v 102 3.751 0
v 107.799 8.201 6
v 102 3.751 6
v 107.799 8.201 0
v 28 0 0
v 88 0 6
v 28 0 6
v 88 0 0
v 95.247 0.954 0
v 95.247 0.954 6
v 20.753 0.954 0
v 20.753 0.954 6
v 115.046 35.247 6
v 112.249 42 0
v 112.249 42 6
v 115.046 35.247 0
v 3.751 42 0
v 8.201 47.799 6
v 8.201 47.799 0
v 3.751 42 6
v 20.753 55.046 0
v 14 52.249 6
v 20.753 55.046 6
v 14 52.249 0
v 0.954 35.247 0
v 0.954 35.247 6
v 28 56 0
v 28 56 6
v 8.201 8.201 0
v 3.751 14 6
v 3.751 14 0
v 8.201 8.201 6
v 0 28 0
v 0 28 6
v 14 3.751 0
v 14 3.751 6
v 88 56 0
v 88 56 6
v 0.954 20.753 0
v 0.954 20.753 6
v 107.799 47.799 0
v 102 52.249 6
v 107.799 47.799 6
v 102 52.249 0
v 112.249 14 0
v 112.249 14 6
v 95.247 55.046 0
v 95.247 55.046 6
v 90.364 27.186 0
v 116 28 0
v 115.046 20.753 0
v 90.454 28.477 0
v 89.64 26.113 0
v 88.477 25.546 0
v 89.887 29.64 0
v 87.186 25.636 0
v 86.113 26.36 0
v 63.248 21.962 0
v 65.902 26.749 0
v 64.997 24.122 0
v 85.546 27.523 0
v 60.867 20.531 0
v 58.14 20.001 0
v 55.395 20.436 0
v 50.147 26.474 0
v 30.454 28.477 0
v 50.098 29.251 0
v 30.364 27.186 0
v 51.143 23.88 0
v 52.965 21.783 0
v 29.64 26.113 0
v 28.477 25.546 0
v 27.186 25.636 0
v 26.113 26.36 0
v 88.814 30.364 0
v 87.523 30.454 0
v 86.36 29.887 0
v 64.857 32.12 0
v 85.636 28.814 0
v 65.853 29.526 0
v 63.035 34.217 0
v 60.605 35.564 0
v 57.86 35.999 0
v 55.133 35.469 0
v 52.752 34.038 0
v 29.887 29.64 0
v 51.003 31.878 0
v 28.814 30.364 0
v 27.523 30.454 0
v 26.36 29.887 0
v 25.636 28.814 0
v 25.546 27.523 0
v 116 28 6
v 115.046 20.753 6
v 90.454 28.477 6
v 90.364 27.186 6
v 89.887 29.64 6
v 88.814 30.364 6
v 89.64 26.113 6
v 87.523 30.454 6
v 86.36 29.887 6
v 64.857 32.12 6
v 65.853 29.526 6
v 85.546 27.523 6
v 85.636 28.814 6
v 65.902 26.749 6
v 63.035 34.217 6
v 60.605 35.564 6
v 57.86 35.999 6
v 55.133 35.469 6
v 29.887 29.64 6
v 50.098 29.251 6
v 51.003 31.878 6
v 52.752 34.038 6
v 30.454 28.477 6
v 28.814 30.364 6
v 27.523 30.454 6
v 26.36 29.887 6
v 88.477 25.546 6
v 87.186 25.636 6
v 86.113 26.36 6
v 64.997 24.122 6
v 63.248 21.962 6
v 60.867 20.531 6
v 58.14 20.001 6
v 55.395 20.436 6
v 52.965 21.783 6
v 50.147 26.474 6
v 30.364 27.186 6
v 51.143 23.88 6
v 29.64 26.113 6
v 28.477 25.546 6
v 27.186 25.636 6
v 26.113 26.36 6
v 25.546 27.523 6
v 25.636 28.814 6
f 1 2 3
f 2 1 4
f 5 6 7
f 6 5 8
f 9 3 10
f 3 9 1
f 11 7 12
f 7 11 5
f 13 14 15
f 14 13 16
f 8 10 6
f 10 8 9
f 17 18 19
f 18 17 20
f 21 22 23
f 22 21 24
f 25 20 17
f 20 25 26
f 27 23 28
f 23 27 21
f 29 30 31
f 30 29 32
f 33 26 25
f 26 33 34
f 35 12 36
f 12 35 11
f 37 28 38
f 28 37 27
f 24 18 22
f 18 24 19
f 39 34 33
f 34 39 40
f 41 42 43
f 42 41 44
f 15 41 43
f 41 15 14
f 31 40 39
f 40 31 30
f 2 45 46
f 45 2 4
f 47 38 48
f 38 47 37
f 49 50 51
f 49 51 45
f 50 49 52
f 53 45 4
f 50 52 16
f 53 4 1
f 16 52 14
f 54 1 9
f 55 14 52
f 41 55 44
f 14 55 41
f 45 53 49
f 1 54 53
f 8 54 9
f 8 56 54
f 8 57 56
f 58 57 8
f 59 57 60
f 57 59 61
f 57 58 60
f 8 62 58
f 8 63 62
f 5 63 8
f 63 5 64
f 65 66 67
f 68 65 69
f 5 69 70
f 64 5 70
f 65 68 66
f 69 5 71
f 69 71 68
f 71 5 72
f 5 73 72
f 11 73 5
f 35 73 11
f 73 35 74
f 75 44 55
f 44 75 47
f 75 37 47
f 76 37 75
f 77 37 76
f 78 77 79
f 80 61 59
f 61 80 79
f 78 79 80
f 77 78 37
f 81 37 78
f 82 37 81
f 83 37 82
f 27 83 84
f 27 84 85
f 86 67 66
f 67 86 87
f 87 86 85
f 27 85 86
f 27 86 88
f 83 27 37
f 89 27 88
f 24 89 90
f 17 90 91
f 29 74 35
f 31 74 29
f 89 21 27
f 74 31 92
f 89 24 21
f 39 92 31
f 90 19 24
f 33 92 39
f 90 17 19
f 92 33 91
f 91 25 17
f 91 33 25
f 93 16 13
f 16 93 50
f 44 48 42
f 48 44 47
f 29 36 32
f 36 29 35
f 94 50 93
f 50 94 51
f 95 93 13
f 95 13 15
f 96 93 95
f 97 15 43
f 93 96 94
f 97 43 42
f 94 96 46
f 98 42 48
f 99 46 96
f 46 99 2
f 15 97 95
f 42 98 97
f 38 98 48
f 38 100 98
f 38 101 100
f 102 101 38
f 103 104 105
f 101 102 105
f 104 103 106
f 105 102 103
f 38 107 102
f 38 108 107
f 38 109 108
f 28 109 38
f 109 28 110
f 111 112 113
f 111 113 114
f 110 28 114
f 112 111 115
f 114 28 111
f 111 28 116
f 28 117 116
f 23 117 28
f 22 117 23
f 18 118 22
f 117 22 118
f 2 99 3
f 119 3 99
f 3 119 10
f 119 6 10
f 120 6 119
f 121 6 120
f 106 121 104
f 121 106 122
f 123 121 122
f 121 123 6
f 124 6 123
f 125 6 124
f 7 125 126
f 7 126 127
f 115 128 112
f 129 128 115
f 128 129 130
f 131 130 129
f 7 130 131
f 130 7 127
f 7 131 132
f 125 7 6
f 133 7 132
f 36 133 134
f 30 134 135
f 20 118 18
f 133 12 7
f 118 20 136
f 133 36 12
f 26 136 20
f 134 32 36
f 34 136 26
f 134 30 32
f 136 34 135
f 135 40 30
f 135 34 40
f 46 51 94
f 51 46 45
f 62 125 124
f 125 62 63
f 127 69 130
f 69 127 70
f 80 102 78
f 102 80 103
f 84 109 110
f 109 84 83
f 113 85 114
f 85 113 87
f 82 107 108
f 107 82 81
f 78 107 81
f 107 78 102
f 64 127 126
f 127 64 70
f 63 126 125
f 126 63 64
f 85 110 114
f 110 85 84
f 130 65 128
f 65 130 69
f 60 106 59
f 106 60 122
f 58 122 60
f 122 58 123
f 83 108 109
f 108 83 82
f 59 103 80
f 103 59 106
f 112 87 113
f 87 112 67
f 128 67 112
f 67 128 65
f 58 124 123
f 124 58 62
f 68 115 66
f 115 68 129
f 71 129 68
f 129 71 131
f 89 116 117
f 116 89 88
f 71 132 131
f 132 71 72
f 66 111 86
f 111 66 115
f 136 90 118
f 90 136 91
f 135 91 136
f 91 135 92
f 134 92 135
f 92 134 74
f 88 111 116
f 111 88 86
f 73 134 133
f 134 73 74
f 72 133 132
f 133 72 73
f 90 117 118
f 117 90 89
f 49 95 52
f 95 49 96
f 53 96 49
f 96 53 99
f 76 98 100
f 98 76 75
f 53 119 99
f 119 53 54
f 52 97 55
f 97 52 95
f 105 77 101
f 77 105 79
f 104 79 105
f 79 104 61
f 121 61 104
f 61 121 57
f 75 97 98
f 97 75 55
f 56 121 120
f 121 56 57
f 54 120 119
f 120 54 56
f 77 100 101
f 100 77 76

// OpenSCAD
$fn = 32;

// ----------------------------------------------------------------------
// Spacer plate: obround span 60, caps R28
// ----------------------------------------------------------------------

// --- parameters (mm) ---
bore_r = 8;               // centre bore radius
bolt_r = 2.5;             // bolt hole radius
plate_t = 6;              // plate thickness, Z (extrusion height)
span = 60;                // obround span
cap_r = 28;               // cap radius

profile = [[28, 56], [20.753, 55.046], [14, 52.249], [8.201, 47.799], [3.751, 42], [0.954, 35.247], [0, 28], [0.954, 20.753], [3.751, 14], [8.201, 8.201], [14, 3.751], [20.753, 0.954], [28, 0], [88, 0], [95.247, 0.954], [102, 3.751], [107.799, 8.201], [112.249, 14], [115.046, 20.753], [116, 28], [115.046, 35.247], [112.249, 42], [107.799, 47.799], [102, 52.249], [95.247, 55.046], [88, 56]];  // primary outline, 26 points, counter clockwise
void_1 = [[65.853, 29.526], [64.857, 32.12], [63.035, 34.217], [60.605, 35.564], [57.86, 35.999], [55.133, 35.469], [52.752, 34.038], [51.003, 31.878], [50.098, 29.251], [50.147, 26.474], [51.143, 23.88], [52.965, 21.783], [55.395, 20.436], [58.14, 20.001], [60.867, 20.531], [63.248, 21.962], [64.997, 24.122], [65.902, 26.749]];  // centre bore, 18 points
void_2 = [[30.454, 28.477], [29.887, 29.64], [28.814, 30.364], [27.523, 30.454], [26.36, 29.887], [25.636, 28.814], [25.546, 27.523], [26.113, 26.36], [27.186, 25.636], [28.477, 25.546], [29.64, 26.113], [30.364, 27.186]];  // end hole, 12 points
void_3 = [[90.454, 28.477], [89.887, 29.64], [88.814, 30.364], [87.523, 30.454], [86.36, 29.887], [85.636, 28.814], [85.546, 27.523], [86.113, 26.36], [87.186, 25.636], [88.477, 25.546], [89.64, 26.113], [90.364, 27.186]];  // end hole, 12 points

// --- the one profile operation ---
difference() {
  linear_extrude(height = plate_t) polygon(points = profile);
  translate([0, 0, -1])
    linear_extrude(height = plate_t + 2) polygon(points = void_1);
  translate([0, 0, -1])
    linear_extrude(height = plate_t + 2) polygon(points = void_2);
  translate([0, 0, -1])
    linear_extrude(height = plate_t + 2) polygon(points = void_3);
}
